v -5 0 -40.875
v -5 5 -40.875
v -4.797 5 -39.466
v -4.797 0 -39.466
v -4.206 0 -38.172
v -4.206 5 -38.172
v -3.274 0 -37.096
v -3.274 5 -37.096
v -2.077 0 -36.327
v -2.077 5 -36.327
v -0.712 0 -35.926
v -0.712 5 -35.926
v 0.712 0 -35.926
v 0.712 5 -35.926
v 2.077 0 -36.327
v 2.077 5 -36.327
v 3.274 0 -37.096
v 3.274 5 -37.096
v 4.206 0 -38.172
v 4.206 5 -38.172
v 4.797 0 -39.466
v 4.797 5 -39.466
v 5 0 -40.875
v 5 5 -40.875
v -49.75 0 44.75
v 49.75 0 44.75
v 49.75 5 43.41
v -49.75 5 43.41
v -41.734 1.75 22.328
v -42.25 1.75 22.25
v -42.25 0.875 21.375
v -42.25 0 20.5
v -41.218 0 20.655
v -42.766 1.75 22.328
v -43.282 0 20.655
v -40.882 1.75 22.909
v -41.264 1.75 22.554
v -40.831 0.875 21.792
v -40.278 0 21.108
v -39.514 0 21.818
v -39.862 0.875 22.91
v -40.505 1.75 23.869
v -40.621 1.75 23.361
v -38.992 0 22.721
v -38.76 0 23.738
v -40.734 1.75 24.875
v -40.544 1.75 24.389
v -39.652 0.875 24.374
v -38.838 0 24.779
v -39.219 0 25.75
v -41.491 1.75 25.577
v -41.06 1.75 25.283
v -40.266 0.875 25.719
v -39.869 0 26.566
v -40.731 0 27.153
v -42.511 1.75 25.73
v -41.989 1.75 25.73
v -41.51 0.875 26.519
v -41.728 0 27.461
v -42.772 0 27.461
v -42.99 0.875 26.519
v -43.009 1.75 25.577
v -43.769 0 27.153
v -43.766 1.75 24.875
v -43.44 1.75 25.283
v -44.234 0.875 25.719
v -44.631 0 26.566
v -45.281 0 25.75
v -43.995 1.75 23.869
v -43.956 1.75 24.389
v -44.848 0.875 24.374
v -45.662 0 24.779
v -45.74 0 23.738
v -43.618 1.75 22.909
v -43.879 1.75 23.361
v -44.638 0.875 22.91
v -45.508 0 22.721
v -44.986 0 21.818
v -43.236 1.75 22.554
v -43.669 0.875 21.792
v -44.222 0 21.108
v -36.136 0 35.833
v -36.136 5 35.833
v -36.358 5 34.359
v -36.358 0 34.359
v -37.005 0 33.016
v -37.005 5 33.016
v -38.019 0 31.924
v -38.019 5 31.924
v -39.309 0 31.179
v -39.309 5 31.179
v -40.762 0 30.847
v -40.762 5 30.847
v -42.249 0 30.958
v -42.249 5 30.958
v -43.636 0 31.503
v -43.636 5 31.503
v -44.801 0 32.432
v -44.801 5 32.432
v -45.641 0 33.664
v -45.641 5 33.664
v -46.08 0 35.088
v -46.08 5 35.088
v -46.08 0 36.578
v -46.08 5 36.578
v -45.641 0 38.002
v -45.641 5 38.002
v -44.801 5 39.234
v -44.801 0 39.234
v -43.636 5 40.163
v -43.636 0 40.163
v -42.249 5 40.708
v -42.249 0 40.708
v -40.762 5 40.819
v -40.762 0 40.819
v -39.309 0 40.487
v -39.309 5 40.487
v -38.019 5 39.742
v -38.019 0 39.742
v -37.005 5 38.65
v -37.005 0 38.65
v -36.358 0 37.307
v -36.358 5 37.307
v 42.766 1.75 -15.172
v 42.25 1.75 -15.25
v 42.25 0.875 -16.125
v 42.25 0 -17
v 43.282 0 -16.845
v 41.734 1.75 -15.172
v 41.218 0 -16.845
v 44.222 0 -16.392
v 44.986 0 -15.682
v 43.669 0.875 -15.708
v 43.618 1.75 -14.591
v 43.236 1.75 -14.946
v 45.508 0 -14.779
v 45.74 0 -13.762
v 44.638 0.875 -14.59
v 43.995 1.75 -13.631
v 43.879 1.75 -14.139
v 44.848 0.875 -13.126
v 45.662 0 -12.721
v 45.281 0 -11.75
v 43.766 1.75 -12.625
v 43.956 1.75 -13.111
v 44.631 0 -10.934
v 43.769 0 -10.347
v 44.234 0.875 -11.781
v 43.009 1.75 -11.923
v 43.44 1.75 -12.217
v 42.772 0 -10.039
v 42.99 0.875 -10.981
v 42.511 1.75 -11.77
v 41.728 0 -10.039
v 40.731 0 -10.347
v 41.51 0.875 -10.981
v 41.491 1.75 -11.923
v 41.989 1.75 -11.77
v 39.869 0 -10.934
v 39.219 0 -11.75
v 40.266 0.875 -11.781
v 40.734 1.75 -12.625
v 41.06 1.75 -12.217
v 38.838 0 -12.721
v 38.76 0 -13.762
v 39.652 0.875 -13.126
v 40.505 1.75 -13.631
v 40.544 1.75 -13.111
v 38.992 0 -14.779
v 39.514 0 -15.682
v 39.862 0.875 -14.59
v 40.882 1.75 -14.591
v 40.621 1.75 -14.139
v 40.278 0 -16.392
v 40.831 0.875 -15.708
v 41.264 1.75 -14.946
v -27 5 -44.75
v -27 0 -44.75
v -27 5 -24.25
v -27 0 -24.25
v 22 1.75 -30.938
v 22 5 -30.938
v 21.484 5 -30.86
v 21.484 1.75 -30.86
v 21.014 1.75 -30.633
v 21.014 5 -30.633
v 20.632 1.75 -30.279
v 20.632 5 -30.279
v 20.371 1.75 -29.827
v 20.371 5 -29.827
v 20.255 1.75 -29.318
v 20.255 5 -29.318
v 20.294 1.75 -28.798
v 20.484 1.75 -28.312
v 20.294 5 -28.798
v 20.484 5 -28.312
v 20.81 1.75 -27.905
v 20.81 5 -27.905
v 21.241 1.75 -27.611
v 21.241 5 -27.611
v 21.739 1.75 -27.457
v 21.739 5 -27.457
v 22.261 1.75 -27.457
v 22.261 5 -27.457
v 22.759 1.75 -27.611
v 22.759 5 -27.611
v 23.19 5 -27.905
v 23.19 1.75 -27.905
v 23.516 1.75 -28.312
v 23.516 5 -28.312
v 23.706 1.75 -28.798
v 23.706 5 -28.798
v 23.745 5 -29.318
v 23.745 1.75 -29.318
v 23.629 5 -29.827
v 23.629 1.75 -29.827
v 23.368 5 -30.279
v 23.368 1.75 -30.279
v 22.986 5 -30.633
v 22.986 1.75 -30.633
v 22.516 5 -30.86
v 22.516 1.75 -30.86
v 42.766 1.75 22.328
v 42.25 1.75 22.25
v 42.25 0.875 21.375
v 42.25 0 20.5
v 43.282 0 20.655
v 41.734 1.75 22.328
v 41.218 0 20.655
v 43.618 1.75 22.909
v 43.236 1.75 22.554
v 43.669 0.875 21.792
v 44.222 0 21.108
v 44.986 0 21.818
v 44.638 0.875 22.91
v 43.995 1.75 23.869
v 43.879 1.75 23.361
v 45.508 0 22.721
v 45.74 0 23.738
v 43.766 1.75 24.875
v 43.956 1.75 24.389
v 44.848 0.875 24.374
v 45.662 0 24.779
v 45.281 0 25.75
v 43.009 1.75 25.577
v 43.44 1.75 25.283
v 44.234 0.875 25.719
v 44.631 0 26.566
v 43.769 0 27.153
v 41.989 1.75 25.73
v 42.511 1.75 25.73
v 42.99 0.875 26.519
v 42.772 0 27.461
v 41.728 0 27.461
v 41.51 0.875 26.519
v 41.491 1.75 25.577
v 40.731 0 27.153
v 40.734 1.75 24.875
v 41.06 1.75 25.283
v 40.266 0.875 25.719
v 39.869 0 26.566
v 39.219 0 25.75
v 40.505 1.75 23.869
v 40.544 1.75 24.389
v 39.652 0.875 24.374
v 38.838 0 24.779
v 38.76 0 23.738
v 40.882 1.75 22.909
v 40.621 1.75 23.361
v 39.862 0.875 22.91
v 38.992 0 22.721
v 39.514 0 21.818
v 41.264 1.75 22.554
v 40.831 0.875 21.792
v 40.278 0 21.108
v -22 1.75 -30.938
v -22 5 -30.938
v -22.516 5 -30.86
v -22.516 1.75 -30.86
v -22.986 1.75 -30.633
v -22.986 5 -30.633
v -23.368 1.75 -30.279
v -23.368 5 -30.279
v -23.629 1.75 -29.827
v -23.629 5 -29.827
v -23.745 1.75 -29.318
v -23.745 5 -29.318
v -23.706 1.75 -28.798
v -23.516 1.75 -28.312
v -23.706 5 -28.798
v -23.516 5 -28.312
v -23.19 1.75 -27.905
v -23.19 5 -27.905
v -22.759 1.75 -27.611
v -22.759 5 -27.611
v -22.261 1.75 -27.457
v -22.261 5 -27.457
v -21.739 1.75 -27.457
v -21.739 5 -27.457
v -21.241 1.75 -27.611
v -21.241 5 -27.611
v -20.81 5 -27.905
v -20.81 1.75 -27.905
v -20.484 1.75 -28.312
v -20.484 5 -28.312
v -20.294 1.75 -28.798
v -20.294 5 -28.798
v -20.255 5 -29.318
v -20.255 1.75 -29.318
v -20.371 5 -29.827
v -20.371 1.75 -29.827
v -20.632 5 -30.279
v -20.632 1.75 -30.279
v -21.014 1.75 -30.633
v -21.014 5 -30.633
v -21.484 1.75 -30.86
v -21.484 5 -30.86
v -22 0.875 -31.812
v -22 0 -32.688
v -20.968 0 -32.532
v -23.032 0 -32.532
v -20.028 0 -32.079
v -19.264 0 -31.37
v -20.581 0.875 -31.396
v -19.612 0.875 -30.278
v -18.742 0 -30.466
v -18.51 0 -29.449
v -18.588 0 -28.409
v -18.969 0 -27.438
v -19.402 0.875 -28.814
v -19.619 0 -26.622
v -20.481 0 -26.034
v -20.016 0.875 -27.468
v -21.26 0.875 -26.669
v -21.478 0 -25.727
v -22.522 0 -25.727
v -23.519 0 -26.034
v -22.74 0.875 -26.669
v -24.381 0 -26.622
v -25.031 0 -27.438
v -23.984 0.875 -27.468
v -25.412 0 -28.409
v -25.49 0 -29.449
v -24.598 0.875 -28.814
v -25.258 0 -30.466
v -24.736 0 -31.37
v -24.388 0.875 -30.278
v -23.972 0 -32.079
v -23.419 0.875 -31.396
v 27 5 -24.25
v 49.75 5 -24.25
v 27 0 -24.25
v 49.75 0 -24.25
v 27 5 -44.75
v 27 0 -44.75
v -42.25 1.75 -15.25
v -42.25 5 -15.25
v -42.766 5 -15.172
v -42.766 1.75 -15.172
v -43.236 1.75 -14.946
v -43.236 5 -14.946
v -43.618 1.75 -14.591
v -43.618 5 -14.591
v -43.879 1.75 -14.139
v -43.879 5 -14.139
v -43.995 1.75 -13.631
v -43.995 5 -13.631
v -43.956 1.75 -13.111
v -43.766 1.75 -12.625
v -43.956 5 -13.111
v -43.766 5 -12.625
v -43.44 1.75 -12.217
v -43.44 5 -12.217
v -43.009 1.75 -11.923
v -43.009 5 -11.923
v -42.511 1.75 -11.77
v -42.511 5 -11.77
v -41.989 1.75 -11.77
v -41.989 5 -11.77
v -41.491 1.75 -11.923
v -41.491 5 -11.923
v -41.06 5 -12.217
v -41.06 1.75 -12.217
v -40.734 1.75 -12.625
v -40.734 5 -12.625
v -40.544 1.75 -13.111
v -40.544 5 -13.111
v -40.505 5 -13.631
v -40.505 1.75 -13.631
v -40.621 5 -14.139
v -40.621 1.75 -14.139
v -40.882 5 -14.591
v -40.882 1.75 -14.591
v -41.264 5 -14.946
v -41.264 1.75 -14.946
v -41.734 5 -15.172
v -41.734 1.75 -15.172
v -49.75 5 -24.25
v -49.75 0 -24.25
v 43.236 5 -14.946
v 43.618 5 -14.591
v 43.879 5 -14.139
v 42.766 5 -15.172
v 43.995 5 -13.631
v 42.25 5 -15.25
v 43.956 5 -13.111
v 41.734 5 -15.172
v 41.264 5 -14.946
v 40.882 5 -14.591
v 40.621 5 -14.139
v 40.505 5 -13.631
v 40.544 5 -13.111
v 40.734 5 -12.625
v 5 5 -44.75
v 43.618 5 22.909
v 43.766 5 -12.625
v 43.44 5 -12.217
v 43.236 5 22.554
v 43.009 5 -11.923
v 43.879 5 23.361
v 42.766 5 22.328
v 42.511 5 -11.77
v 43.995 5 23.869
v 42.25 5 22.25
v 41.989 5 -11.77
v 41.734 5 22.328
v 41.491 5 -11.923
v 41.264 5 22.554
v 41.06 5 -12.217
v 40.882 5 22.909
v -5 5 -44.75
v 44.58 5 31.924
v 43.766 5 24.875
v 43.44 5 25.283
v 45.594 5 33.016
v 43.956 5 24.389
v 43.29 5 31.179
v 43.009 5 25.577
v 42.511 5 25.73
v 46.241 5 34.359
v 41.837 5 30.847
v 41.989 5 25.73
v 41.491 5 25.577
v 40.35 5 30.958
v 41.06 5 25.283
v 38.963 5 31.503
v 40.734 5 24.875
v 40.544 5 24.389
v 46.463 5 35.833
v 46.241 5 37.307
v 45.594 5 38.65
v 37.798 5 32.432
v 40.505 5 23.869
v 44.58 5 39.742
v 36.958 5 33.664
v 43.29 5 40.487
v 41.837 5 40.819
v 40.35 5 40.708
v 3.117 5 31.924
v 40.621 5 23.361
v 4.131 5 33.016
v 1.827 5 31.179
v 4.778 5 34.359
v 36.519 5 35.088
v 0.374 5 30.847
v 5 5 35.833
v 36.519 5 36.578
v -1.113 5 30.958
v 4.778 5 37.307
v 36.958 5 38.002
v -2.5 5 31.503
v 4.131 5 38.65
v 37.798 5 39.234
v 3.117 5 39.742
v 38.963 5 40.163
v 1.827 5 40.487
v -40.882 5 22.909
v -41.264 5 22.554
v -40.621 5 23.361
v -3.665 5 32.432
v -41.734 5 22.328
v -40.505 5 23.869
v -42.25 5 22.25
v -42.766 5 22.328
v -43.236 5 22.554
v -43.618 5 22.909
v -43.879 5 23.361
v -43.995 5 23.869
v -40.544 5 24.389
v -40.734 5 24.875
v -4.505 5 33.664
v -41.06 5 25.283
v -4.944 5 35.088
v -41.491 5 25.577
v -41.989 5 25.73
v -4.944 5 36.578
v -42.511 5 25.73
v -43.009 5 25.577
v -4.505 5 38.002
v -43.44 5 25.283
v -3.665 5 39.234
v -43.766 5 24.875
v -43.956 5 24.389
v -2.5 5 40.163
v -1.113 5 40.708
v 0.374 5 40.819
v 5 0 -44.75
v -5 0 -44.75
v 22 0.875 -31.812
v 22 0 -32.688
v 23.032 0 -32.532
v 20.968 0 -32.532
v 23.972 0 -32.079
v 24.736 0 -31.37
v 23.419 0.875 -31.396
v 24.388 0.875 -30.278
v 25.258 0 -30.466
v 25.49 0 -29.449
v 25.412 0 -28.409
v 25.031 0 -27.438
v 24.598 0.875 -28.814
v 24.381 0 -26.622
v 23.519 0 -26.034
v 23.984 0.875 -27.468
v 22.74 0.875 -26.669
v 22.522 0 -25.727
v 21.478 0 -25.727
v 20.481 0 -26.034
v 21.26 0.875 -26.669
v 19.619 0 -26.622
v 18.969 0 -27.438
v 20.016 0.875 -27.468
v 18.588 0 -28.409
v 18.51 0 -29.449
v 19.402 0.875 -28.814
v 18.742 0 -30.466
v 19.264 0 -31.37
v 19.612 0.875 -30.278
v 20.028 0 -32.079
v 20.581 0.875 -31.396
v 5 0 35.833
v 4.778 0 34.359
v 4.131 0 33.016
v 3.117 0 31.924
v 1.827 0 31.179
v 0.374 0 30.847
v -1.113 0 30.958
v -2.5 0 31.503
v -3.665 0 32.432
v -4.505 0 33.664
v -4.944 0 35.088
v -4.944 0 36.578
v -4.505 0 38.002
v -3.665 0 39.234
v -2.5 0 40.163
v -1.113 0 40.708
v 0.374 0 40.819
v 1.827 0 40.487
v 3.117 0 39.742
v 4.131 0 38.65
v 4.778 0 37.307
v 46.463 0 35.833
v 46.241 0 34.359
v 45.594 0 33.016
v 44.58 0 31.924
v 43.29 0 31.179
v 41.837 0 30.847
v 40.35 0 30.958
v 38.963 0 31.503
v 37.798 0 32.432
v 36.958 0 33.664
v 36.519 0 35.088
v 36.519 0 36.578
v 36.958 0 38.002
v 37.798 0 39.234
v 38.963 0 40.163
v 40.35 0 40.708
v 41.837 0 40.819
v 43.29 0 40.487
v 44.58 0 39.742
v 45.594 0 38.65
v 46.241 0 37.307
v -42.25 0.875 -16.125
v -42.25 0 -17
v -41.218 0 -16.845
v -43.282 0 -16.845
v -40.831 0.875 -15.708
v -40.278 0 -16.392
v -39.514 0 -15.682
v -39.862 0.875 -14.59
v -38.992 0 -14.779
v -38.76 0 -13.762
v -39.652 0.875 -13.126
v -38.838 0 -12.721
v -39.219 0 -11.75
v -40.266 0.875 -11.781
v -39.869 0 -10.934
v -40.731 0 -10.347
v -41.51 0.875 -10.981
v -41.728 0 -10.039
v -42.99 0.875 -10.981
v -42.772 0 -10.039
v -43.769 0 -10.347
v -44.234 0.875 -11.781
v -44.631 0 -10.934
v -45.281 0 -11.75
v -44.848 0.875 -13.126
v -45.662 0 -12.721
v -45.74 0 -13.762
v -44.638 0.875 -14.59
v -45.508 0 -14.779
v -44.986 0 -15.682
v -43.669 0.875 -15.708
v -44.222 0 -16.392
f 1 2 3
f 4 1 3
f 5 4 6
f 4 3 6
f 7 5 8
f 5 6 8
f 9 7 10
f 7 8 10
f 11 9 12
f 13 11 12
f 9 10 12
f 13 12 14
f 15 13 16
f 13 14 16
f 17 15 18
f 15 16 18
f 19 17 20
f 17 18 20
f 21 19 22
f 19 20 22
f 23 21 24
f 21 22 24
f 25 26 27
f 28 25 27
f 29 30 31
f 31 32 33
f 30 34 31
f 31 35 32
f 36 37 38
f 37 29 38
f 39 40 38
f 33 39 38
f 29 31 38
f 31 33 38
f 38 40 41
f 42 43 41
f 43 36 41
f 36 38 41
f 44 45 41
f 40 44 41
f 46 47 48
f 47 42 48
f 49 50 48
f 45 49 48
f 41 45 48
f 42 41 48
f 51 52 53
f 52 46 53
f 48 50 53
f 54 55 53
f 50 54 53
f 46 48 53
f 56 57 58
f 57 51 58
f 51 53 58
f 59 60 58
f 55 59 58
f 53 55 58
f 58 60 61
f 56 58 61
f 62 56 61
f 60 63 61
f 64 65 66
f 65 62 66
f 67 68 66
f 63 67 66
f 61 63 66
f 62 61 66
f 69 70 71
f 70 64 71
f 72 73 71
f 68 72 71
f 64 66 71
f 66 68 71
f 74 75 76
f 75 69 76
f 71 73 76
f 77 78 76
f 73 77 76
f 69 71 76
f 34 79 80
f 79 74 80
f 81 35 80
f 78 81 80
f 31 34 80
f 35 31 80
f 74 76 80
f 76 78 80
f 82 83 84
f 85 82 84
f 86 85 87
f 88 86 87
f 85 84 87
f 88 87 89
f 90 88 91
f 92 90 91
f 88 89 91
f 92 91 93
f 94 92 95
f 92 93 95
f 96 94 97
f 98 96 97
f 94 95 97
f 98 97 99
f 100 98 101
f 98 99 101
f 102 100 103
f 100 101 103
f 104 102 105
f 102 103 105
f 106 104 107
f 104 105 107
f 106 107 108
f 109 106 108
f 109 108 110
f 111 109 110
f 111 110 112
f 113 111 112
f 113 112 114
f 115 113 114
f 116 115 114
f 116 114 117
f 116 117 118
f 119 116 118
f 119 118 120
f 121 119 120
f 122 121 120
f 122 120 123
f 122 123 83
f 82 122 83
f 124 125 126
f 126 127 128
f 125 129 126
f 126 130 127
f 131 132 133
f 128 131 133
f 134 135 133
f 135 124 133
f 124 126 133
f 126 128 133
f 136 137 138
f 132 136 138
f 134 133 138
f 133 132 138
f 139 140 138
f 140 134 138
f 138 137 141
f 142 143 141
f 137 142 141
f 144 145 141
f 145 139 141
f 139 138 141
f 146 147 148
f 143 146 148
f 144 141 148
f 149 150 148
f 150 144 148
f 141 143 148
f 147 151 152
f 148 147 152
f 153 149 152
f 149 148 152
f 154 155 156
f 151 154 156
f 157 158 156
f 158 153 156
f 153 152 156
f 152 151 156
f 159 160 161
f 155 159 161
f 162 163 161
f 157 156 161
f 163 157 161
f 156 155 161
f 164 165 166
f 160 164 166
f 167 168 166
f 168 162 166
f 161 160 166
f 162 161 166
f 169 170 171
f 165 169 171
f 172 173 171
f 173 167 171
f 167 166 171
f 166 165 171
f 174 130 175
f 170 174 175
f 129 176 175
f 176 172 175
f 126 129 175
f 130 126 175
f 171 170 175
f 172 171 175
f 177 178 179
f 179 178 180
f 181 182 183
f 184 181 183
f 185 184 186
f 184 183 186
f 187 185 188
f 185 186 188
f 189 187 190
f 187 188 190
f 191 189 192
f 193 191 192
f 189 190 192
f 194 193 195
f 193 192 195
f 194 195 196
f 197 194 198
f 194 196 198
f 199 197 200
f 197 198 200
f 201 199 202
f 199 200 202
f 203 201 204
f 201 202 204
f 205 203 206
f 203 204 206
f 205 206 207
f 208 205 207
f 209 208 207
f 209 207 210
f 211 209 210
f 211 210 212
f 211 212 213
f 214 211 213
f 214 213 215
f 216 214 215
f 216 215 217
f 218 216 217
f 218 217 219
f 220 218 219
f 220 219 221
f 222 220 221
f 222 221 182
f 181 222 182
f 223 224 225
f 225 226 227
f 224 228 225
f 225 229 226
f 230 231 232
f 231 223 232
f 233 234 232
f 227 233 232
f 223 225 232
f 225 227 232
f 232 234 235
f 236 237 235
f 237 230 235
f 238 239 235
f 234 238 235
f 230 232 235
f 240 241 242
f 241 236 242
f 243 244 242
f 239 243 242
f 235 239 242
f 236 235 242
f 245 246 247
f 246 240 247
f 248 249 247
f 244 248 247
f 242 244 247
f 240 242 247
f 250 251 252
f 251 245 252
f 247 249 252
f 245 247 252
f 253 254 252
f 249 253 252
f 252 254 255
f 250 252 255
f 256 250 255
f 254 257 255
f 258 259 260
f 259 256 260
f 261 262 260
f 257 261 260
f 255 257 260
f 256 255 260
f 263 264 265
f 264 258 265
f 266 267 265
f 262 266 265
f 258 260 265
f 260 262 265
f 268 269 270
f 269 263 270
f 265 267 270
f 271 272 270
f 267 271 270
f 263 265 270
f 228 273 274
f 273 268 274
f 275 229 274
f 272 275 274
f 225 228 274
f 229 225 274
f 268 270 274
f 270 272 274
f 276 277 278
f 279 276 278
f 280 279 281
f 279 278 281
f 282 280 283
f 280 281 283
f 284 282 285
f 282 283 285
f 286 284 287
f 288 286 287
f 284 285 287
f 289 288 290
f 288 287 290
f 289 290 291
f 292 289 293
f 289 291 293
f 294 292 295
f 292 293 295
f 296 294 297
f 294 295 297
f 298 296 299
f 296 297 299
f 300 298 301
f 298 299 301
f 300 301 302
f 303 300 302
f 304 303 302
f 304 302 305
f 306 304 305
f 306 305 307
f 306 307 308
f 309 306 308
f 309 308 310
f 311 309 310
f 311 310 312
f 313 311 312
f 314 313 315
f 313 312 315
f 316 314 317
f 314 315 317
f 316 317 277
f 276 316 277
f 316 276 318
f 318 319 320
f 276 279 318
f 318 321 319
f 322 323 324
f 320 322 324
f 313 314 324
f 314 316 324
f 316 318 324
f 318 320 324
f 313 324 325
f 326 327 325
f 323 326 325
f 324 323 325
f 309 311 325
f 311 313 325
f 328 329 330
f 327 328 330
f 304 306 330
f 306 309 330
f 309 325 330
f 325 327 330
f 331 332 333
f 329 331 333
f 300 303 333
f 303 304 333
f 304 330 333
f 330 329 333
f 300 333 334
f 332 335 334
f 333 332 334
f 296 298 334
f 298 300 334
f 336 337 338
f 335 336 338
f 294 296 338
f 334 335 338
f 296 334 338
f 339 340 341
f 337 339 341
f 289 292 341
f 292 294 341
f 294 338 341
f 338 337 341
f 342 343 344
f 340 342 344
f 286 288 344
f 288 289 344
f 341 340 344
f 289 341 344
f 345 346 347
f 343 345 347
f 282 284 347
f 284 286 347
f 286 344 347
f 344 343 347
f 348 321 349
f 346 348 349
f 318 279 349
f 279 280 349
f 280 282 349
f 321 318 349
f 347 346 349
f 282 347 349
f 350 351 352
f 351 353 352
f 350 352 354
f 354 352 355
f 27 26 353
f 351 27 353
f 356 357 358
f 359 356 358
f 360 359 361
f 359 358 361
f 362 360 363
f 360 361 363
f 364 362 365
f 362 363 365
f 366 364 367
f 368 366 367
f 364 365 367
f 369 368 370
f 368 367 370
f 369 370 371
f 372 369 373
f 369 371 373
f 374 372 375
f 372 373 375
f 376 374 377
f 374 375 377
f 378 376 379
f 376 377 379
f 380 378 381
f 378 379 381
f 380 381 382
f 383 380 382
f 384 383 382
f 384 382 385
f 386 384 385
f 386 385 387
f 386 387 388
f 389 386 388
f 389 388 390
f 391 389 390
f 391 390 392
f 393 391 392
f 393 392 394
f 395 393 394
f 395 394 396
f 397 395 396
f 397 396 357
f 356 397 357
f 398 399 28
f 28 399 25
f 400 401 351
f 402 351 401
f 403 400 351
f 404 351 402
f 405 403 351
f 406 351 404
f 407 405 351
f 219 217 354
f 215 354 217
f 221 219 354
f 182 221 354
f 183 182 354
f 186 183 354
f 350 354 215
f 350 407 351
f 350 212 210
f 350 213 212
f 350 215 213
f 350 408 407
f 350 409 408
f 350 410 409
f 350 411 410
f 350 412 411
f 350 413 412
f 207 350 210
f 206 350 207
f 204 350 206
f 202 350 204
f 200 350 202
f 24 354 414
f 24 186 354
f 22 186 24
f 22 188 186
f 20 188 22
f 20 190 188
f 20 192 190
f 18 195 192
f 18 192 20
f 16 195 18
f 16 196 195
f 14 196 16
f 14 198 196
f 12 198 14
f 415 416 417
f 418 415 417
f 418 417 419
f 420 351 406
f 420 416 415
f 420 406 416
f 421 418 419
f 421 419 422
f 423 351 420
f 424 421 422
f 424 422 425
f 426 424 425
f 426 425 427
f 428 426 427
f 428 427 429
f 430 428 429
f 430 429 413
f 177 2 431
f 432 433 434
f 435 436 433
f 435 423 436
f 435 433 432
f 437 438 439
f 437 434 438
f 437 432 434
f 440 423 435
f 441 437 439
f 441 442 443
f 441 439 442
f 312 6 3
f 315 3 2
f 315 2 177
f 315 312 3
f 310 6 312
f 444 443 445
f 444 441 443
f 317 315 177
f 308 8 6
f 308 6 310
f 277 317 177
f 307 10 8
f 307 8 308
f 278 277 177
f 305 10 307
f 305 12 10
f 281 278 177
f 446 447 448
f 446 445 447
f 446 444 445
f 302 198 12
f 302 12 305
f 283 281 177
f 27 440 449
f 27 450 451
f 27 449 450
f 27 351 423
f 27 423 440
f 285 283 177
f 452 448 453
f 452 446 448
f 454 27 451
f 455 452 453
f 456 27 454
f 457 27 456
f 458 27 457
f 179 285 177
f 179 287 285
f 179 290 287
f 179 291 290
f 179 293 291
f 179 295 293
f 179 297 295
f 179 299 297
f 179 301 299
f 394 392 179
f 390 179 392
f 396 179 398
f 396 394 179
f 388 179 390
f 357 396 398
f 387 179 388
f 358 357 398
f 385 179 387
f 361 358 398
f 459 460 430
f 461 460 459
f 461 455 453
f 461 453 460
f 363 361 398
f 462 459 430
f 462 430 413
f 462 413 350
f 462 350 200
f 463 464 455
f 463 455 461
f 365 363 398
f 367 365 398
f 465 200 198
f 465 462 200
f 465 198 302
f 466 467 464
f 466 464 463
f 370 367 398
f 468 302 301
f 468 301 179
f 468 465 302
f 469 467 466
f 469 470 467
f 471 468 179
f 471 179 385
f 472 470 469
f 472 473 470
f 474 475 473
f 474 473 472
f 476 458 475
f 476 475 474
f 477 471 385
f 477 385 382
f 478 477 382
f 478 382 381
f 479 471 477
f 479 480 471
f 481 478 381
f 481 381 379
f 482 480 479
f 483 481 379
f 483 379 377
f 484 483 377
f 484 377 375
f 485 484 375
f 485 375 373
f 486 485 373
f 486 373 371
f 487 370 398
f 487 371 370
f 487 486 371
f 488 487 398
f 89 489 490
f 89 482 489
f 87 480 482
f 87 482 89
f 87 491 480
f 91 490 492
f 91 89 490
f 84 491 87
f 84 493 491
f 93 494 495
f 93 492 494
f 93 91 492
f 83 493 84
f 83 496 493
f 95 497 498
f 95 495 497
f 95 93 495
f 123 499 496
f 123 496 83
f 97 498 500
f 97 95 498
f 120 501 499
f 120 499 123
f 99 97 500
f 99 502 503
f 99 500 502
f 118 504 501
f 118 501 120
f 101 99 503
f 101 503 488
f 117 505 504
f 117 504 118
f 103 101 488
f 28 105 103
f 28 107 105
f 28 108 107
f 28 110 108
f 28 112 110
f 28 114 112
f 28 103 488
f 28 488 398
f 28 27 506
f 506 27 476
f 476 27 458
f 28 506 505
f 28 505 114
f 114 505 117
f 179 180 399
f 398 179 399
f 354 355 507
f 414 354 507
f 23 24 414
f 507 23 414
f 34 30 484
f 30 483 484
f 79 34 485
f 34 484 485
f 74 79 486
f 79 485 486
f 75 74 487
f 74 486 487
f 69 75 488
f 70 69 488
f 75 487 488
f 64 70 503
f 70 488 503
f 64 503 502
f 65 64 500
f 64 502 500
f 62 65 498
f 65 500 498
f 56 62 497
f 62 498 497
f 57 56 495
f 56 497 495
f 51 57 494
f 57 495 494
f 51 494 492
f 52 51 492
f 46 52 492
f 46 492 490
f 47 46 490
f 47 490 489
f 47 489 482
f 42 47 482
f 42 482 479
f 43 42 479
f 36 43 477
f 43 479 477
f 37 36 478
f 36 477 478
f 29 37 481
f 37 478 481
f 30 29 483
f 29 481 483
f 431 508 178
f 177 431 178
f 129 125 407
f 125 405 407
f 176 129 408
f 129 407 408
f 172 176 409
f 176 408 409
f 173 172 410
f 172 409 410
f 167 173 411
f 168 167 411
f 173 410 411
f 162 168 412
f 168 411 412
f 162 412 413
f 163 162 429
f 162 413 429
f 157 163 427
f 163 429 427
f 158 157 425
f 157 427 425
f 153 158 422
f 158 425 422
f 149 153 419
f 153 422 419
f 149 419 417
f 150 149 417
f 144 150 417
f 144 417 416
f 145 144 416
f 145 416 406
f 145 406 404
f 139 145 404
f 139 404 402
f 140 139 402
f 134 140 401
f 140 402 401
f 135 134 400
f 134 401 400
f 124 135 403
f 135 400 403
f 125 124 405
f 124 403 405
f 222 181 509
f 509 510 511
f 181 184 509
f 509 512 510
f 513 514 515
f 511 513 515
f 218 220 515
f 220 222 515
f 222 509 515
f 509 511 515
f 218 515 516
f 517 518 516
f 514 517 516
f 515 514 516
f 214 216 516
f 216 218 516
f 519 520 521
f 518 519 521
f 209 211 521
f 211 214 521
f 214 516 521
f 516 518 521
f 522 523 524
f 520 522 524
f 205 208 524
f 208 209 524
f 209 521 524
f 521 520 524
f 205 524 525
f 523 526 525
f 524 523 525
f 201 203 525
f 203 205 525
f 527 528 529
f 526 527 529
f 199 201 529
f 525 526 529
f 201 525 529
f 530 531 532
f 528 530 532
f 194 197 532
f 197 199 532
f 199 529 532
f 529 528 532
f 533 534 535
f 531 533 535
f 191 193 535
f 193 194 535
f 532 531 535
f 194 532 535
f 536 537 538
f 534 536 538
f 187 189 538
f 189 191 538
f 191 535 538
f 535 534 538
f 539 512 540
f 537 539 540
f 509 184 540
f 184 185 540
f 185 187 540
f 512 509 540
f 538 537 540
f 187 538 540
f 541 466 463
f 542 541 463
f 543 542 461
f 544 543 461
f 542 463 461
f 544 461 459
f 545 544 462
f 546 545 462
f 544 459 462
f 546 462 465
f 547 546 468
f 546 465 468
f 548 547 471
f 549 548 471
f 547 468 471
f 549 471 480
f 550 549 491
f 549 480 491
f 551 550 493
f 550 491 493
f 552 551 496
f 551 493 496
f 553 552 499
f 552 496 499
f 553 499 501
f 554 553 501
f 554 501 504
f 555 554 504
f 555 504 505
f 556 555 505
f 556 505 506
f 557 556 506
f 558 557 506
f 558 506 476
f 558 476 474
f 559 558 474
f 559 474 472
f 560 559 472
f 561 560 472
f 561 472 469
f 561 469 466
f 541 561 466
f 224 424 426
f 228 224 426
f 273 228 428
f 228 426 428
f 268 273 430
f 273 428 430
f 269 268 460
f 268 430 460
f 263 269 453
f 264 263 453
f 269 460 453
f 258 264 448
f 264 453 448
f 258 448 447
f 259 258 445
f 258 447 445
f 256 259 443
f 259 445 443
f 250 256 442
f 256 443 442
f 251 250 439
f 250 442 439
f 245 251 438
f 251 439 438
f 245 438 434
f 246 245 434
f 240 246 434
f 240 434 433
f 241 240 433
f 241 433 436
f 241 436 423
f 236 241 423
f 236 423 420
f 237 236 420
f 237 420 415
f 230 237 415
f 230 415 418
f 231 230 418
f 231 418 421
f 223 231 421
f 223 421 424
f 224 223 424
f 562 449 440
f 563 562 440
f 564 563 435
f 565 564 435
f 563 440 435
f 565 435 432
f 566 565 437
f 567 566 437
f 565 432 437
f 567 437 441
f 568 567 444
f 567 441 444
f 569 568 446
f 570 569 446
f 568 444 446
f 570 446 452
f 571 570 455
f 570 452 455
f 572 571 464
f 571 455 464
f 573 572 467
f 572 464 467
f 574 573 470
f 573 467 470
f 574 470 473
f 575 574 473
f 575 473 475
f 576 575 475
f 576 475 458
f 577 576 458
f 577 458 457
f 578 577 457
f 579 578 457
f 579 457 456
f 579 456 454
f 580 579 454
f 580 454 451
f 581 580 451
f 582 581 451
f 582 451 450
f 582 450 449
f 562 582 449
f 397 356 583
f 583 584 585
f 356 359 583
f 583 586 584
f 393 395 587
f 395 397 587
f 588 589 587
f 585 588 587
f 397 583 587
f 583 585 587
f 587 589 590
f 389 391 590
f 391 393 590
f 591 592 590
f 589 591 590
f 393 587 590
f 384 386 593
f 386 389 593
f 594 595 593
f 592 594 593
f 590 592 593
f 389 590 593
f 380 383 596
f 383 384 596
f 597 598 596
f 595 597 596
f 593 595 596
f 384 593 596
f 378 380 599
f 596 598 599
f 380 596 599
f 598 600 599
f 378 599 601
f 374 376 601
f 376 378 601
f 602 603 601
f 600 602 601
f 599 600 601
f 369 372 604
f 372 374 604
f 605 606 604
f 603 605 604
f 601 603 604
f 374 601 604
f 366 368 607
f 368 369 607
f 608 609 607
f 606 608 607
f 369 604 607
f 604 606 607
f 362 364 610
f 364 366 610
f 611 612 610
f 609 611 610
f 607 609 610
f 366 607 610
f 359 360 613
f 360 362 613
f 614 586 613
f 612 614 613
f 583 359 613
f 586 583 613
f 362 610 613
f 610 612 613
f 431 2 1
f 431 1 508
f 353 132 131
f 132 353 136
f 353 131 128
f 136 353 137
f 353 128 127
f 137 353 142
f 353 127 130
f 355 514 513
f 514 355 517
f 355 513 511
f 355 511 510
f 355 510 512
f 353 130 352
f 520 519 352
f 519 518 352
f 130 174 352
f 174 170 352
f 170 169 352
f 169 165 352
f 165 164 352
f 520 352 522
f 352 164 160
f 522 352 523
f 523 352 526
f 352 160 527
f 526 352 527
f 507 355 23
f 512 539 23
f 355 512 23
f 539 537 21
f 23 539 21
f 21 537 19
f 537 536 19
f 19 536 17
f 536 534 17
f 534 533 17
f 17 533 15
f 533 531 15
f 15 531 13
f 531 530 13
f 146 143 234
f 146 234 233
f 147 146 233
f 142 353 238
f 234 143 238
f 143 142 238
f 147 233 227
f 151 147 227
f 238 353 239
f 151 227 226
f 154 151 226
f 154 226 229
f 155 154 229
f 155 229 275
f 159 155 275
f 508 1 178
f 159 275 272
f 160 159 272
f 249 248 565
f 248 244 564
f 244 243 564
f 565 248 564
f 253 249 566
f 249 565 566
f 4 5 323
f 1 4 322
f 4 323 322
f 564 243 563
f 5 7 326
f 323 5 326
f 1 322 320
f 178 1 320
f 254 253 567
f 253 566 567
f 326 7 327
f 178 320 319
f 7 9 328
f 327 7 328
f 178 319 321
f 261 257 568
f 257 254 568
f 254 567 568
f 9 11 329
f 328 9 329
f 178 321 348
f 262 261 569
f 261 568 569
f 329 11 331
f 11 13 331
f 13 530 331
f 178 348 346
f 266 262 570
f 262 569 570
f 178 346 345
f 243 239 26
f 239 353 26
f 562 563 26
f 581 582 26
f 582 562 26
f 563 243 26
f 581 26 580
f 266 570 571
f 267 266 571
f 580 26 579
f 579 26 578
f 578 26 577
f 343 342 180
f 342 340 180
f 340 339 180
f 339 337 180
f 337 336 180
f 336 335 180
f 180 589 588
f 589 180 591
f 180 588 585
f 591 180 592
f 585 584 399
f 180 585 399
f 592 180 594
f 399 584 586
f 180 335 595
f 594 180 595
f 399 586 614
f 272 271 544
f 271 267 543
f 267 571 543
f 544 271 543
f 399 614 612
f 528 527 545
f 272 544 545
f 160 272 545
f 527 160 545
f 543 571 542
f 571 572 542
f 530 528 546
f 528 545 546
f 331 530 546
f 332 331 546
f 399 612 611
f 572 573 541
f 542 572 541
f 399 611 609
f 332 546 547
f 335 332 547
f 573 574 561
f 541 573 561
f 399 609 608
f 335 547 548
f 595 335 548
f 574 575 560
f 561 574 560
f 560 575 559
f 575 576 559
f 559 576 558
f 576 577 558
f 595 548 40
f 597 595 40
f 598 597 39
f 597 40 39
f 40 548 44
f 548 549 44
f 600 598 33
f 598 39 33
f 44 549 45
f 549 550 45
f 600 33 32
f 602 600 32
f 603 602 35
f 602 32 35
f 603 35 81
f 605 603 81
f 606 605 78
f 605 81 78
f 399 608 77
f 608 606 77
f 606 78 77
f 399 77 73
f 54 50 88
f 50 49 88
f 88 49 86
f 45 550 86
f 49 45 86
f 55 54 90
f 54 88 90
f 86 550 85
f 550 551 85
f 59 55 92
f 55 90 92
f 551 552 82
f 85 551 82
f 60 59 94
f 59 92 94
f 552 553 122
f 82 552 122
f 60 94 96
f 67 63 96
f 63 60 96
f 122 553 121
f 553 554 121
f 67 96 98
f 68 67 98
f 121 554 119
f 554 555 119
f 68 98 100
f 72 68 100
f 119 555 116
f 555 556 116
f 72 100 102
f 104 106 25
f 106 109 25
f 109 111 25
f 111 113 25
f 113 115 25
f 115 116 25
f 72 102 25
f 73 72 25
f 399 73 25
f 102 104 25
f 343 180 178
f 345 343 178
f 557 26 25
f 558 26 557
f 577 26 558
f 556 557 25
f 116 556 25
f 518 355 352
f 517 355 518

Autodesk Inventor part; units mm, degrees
ref_plane "YZ Plane" through (0, 0, 0) normal (1, 0, 0) x (0, 1, 0)
ref_plane "XZ Plane" through (0, 0, 0) normal (0, 1, 0) x (-1, 0, 0)
ref_plane "XY Plane" through (0, 0, 0) normal (0, 0, 1) x (1, 0, 0)
sketch "Náčrt1" plane through (0, 0, 0) normal (0, 1, 0) x (-1, 0, 0)
  line L0 (49.75, -24.25) -> (49.75, 44.75)
  line L1 (49.75, 44.75) -> (-49.75, 44.75)
  line L2 (-49.75, 44.75) -> (-49.75, -24.25)
  line L3 (-49.75, -24.25) -> (-27, -24.25)
  line L4 (-27, -24.25) -> (-27, -44.75)
  line L5 (-27, -44.75) -> (27, -44.75)
  line L6 (27, -44.75) -> (27, -24.25)
  line L7 (27, -24.25) -> (49.75, -24.25)
  line L8 (49.75, -44.75) -> (0, 0) construction
  line L9 (0, 0) -> (-49.75, -44.75) construction
  line L10 (49.75, 44.75) -> (0, 0) construction
  line L11 (-49.75, 44.75) -> (0, 0) construction
  dimension "d0" = 99.5
  dimension "d1" = 89.5
  dimension "d2" = 20.5
  dimension "d3" = 54
extrude "Vysunutí1" add sketch "Náčrt1" along normal blind 5
sketch "Náčrt2" plane through (0, 5, 0) normal (0, 1, 0) x (1, 0, 0)
  circle A0 centre (0, -35.833) radius 5
  circle A1 centre (41.463, -35.833) radius 5
  circle A2 centre (-41.136, -35.833) radius 5
  circle A3 centre (0, 40.875) radius 5
  line L0 (49.75, -44.75) -> (49.75, 24.25) projected
  line L1 (-49.75, 24.25) -> (-49.75, -44.75) projected
  line L2 (-49.75, -44.75) -> (49.75, -44.75) projected
  line L3 (27, 44.75) -> (-27, 44.75) projected
  line L4 (-5, 40.875) -> (-5, 44.75)
  line L5 (5, 40.875) -> (5, 44.75)
  point P0 (0, 0)
  point P1 (3.1598, 44.75)
  point P2 (-3.1598, 44.75)
  dimension "d6" = 10
  dimension "d7" = 8.287
  dimension "d8" = 8.614
  dimension "d9" = 8.917
  dimension "d10" = 3.875
extrude "Vysunutí2" cut sketch "Náčrt2" against normal through all
sketch "Náčrt3" plane through (49.75, 0, 44.75) normal (1, 0, 0) x (0, 0, -1)
  line L0 (0, 0) -> (69, 0) projected
  line L1 (0, 0) -> (1.3397, 5)
  line L2 (69, 5) -> (0, 5) projected
  line L3 (0, 0) -> (0, 5) projected
  point P0 (44.75, 0)
  dimension "d13" = 75
extrude "Vysunutí3" cut sketch "Náčrt3" against normal through all
sketch "Náčrt4" plane through (0, 0, 0) normal (0, -1, 0) x (1, 0, 0)
  line L0 (49.75, -24.25) -> (27, -24.25) projected
  line L1 (49.75, 44.75) -> (49.75, -24.25) projected
  line L2 (-49.75, -24.25) -> (-49.75, 44.75) projected
  line L3 (-27, -44.75) -> (-27, -24.25) projected
  line L4 (27, -24.25) -> (27, -44.75) projected
  point P0 (0, 0)
  point P1 (42.25, -13.5)
  point P2 (-42.25, -13.5)
  point P3 (42.25, 24)
  point P4 (-42.25, 24)
  point P5 (22, -29.1875)
  point P6 (-22, -29.1875)
  dimension "d16" = 10.75
  dimension "d17" = 7.5
  dimension "d18" = 7.5
  dimension "d19" = 37.5
  dimension "d27" = 5
  dimension "d28" = 5
  dimension "d29" = 4.9375
hole "Díra1" at (-42.25, 0, -13.5) at (-42.25, 0, 24) at (42.25, 0, 24) at (42.25, 0, -13.5) at (22, 0, -29.1875) at (-22, 0, -29.1875) direction (0, 1, 0) diameter 3.5 end through all countersink diameter 7 countersink angle 90
properties part number "plech"
